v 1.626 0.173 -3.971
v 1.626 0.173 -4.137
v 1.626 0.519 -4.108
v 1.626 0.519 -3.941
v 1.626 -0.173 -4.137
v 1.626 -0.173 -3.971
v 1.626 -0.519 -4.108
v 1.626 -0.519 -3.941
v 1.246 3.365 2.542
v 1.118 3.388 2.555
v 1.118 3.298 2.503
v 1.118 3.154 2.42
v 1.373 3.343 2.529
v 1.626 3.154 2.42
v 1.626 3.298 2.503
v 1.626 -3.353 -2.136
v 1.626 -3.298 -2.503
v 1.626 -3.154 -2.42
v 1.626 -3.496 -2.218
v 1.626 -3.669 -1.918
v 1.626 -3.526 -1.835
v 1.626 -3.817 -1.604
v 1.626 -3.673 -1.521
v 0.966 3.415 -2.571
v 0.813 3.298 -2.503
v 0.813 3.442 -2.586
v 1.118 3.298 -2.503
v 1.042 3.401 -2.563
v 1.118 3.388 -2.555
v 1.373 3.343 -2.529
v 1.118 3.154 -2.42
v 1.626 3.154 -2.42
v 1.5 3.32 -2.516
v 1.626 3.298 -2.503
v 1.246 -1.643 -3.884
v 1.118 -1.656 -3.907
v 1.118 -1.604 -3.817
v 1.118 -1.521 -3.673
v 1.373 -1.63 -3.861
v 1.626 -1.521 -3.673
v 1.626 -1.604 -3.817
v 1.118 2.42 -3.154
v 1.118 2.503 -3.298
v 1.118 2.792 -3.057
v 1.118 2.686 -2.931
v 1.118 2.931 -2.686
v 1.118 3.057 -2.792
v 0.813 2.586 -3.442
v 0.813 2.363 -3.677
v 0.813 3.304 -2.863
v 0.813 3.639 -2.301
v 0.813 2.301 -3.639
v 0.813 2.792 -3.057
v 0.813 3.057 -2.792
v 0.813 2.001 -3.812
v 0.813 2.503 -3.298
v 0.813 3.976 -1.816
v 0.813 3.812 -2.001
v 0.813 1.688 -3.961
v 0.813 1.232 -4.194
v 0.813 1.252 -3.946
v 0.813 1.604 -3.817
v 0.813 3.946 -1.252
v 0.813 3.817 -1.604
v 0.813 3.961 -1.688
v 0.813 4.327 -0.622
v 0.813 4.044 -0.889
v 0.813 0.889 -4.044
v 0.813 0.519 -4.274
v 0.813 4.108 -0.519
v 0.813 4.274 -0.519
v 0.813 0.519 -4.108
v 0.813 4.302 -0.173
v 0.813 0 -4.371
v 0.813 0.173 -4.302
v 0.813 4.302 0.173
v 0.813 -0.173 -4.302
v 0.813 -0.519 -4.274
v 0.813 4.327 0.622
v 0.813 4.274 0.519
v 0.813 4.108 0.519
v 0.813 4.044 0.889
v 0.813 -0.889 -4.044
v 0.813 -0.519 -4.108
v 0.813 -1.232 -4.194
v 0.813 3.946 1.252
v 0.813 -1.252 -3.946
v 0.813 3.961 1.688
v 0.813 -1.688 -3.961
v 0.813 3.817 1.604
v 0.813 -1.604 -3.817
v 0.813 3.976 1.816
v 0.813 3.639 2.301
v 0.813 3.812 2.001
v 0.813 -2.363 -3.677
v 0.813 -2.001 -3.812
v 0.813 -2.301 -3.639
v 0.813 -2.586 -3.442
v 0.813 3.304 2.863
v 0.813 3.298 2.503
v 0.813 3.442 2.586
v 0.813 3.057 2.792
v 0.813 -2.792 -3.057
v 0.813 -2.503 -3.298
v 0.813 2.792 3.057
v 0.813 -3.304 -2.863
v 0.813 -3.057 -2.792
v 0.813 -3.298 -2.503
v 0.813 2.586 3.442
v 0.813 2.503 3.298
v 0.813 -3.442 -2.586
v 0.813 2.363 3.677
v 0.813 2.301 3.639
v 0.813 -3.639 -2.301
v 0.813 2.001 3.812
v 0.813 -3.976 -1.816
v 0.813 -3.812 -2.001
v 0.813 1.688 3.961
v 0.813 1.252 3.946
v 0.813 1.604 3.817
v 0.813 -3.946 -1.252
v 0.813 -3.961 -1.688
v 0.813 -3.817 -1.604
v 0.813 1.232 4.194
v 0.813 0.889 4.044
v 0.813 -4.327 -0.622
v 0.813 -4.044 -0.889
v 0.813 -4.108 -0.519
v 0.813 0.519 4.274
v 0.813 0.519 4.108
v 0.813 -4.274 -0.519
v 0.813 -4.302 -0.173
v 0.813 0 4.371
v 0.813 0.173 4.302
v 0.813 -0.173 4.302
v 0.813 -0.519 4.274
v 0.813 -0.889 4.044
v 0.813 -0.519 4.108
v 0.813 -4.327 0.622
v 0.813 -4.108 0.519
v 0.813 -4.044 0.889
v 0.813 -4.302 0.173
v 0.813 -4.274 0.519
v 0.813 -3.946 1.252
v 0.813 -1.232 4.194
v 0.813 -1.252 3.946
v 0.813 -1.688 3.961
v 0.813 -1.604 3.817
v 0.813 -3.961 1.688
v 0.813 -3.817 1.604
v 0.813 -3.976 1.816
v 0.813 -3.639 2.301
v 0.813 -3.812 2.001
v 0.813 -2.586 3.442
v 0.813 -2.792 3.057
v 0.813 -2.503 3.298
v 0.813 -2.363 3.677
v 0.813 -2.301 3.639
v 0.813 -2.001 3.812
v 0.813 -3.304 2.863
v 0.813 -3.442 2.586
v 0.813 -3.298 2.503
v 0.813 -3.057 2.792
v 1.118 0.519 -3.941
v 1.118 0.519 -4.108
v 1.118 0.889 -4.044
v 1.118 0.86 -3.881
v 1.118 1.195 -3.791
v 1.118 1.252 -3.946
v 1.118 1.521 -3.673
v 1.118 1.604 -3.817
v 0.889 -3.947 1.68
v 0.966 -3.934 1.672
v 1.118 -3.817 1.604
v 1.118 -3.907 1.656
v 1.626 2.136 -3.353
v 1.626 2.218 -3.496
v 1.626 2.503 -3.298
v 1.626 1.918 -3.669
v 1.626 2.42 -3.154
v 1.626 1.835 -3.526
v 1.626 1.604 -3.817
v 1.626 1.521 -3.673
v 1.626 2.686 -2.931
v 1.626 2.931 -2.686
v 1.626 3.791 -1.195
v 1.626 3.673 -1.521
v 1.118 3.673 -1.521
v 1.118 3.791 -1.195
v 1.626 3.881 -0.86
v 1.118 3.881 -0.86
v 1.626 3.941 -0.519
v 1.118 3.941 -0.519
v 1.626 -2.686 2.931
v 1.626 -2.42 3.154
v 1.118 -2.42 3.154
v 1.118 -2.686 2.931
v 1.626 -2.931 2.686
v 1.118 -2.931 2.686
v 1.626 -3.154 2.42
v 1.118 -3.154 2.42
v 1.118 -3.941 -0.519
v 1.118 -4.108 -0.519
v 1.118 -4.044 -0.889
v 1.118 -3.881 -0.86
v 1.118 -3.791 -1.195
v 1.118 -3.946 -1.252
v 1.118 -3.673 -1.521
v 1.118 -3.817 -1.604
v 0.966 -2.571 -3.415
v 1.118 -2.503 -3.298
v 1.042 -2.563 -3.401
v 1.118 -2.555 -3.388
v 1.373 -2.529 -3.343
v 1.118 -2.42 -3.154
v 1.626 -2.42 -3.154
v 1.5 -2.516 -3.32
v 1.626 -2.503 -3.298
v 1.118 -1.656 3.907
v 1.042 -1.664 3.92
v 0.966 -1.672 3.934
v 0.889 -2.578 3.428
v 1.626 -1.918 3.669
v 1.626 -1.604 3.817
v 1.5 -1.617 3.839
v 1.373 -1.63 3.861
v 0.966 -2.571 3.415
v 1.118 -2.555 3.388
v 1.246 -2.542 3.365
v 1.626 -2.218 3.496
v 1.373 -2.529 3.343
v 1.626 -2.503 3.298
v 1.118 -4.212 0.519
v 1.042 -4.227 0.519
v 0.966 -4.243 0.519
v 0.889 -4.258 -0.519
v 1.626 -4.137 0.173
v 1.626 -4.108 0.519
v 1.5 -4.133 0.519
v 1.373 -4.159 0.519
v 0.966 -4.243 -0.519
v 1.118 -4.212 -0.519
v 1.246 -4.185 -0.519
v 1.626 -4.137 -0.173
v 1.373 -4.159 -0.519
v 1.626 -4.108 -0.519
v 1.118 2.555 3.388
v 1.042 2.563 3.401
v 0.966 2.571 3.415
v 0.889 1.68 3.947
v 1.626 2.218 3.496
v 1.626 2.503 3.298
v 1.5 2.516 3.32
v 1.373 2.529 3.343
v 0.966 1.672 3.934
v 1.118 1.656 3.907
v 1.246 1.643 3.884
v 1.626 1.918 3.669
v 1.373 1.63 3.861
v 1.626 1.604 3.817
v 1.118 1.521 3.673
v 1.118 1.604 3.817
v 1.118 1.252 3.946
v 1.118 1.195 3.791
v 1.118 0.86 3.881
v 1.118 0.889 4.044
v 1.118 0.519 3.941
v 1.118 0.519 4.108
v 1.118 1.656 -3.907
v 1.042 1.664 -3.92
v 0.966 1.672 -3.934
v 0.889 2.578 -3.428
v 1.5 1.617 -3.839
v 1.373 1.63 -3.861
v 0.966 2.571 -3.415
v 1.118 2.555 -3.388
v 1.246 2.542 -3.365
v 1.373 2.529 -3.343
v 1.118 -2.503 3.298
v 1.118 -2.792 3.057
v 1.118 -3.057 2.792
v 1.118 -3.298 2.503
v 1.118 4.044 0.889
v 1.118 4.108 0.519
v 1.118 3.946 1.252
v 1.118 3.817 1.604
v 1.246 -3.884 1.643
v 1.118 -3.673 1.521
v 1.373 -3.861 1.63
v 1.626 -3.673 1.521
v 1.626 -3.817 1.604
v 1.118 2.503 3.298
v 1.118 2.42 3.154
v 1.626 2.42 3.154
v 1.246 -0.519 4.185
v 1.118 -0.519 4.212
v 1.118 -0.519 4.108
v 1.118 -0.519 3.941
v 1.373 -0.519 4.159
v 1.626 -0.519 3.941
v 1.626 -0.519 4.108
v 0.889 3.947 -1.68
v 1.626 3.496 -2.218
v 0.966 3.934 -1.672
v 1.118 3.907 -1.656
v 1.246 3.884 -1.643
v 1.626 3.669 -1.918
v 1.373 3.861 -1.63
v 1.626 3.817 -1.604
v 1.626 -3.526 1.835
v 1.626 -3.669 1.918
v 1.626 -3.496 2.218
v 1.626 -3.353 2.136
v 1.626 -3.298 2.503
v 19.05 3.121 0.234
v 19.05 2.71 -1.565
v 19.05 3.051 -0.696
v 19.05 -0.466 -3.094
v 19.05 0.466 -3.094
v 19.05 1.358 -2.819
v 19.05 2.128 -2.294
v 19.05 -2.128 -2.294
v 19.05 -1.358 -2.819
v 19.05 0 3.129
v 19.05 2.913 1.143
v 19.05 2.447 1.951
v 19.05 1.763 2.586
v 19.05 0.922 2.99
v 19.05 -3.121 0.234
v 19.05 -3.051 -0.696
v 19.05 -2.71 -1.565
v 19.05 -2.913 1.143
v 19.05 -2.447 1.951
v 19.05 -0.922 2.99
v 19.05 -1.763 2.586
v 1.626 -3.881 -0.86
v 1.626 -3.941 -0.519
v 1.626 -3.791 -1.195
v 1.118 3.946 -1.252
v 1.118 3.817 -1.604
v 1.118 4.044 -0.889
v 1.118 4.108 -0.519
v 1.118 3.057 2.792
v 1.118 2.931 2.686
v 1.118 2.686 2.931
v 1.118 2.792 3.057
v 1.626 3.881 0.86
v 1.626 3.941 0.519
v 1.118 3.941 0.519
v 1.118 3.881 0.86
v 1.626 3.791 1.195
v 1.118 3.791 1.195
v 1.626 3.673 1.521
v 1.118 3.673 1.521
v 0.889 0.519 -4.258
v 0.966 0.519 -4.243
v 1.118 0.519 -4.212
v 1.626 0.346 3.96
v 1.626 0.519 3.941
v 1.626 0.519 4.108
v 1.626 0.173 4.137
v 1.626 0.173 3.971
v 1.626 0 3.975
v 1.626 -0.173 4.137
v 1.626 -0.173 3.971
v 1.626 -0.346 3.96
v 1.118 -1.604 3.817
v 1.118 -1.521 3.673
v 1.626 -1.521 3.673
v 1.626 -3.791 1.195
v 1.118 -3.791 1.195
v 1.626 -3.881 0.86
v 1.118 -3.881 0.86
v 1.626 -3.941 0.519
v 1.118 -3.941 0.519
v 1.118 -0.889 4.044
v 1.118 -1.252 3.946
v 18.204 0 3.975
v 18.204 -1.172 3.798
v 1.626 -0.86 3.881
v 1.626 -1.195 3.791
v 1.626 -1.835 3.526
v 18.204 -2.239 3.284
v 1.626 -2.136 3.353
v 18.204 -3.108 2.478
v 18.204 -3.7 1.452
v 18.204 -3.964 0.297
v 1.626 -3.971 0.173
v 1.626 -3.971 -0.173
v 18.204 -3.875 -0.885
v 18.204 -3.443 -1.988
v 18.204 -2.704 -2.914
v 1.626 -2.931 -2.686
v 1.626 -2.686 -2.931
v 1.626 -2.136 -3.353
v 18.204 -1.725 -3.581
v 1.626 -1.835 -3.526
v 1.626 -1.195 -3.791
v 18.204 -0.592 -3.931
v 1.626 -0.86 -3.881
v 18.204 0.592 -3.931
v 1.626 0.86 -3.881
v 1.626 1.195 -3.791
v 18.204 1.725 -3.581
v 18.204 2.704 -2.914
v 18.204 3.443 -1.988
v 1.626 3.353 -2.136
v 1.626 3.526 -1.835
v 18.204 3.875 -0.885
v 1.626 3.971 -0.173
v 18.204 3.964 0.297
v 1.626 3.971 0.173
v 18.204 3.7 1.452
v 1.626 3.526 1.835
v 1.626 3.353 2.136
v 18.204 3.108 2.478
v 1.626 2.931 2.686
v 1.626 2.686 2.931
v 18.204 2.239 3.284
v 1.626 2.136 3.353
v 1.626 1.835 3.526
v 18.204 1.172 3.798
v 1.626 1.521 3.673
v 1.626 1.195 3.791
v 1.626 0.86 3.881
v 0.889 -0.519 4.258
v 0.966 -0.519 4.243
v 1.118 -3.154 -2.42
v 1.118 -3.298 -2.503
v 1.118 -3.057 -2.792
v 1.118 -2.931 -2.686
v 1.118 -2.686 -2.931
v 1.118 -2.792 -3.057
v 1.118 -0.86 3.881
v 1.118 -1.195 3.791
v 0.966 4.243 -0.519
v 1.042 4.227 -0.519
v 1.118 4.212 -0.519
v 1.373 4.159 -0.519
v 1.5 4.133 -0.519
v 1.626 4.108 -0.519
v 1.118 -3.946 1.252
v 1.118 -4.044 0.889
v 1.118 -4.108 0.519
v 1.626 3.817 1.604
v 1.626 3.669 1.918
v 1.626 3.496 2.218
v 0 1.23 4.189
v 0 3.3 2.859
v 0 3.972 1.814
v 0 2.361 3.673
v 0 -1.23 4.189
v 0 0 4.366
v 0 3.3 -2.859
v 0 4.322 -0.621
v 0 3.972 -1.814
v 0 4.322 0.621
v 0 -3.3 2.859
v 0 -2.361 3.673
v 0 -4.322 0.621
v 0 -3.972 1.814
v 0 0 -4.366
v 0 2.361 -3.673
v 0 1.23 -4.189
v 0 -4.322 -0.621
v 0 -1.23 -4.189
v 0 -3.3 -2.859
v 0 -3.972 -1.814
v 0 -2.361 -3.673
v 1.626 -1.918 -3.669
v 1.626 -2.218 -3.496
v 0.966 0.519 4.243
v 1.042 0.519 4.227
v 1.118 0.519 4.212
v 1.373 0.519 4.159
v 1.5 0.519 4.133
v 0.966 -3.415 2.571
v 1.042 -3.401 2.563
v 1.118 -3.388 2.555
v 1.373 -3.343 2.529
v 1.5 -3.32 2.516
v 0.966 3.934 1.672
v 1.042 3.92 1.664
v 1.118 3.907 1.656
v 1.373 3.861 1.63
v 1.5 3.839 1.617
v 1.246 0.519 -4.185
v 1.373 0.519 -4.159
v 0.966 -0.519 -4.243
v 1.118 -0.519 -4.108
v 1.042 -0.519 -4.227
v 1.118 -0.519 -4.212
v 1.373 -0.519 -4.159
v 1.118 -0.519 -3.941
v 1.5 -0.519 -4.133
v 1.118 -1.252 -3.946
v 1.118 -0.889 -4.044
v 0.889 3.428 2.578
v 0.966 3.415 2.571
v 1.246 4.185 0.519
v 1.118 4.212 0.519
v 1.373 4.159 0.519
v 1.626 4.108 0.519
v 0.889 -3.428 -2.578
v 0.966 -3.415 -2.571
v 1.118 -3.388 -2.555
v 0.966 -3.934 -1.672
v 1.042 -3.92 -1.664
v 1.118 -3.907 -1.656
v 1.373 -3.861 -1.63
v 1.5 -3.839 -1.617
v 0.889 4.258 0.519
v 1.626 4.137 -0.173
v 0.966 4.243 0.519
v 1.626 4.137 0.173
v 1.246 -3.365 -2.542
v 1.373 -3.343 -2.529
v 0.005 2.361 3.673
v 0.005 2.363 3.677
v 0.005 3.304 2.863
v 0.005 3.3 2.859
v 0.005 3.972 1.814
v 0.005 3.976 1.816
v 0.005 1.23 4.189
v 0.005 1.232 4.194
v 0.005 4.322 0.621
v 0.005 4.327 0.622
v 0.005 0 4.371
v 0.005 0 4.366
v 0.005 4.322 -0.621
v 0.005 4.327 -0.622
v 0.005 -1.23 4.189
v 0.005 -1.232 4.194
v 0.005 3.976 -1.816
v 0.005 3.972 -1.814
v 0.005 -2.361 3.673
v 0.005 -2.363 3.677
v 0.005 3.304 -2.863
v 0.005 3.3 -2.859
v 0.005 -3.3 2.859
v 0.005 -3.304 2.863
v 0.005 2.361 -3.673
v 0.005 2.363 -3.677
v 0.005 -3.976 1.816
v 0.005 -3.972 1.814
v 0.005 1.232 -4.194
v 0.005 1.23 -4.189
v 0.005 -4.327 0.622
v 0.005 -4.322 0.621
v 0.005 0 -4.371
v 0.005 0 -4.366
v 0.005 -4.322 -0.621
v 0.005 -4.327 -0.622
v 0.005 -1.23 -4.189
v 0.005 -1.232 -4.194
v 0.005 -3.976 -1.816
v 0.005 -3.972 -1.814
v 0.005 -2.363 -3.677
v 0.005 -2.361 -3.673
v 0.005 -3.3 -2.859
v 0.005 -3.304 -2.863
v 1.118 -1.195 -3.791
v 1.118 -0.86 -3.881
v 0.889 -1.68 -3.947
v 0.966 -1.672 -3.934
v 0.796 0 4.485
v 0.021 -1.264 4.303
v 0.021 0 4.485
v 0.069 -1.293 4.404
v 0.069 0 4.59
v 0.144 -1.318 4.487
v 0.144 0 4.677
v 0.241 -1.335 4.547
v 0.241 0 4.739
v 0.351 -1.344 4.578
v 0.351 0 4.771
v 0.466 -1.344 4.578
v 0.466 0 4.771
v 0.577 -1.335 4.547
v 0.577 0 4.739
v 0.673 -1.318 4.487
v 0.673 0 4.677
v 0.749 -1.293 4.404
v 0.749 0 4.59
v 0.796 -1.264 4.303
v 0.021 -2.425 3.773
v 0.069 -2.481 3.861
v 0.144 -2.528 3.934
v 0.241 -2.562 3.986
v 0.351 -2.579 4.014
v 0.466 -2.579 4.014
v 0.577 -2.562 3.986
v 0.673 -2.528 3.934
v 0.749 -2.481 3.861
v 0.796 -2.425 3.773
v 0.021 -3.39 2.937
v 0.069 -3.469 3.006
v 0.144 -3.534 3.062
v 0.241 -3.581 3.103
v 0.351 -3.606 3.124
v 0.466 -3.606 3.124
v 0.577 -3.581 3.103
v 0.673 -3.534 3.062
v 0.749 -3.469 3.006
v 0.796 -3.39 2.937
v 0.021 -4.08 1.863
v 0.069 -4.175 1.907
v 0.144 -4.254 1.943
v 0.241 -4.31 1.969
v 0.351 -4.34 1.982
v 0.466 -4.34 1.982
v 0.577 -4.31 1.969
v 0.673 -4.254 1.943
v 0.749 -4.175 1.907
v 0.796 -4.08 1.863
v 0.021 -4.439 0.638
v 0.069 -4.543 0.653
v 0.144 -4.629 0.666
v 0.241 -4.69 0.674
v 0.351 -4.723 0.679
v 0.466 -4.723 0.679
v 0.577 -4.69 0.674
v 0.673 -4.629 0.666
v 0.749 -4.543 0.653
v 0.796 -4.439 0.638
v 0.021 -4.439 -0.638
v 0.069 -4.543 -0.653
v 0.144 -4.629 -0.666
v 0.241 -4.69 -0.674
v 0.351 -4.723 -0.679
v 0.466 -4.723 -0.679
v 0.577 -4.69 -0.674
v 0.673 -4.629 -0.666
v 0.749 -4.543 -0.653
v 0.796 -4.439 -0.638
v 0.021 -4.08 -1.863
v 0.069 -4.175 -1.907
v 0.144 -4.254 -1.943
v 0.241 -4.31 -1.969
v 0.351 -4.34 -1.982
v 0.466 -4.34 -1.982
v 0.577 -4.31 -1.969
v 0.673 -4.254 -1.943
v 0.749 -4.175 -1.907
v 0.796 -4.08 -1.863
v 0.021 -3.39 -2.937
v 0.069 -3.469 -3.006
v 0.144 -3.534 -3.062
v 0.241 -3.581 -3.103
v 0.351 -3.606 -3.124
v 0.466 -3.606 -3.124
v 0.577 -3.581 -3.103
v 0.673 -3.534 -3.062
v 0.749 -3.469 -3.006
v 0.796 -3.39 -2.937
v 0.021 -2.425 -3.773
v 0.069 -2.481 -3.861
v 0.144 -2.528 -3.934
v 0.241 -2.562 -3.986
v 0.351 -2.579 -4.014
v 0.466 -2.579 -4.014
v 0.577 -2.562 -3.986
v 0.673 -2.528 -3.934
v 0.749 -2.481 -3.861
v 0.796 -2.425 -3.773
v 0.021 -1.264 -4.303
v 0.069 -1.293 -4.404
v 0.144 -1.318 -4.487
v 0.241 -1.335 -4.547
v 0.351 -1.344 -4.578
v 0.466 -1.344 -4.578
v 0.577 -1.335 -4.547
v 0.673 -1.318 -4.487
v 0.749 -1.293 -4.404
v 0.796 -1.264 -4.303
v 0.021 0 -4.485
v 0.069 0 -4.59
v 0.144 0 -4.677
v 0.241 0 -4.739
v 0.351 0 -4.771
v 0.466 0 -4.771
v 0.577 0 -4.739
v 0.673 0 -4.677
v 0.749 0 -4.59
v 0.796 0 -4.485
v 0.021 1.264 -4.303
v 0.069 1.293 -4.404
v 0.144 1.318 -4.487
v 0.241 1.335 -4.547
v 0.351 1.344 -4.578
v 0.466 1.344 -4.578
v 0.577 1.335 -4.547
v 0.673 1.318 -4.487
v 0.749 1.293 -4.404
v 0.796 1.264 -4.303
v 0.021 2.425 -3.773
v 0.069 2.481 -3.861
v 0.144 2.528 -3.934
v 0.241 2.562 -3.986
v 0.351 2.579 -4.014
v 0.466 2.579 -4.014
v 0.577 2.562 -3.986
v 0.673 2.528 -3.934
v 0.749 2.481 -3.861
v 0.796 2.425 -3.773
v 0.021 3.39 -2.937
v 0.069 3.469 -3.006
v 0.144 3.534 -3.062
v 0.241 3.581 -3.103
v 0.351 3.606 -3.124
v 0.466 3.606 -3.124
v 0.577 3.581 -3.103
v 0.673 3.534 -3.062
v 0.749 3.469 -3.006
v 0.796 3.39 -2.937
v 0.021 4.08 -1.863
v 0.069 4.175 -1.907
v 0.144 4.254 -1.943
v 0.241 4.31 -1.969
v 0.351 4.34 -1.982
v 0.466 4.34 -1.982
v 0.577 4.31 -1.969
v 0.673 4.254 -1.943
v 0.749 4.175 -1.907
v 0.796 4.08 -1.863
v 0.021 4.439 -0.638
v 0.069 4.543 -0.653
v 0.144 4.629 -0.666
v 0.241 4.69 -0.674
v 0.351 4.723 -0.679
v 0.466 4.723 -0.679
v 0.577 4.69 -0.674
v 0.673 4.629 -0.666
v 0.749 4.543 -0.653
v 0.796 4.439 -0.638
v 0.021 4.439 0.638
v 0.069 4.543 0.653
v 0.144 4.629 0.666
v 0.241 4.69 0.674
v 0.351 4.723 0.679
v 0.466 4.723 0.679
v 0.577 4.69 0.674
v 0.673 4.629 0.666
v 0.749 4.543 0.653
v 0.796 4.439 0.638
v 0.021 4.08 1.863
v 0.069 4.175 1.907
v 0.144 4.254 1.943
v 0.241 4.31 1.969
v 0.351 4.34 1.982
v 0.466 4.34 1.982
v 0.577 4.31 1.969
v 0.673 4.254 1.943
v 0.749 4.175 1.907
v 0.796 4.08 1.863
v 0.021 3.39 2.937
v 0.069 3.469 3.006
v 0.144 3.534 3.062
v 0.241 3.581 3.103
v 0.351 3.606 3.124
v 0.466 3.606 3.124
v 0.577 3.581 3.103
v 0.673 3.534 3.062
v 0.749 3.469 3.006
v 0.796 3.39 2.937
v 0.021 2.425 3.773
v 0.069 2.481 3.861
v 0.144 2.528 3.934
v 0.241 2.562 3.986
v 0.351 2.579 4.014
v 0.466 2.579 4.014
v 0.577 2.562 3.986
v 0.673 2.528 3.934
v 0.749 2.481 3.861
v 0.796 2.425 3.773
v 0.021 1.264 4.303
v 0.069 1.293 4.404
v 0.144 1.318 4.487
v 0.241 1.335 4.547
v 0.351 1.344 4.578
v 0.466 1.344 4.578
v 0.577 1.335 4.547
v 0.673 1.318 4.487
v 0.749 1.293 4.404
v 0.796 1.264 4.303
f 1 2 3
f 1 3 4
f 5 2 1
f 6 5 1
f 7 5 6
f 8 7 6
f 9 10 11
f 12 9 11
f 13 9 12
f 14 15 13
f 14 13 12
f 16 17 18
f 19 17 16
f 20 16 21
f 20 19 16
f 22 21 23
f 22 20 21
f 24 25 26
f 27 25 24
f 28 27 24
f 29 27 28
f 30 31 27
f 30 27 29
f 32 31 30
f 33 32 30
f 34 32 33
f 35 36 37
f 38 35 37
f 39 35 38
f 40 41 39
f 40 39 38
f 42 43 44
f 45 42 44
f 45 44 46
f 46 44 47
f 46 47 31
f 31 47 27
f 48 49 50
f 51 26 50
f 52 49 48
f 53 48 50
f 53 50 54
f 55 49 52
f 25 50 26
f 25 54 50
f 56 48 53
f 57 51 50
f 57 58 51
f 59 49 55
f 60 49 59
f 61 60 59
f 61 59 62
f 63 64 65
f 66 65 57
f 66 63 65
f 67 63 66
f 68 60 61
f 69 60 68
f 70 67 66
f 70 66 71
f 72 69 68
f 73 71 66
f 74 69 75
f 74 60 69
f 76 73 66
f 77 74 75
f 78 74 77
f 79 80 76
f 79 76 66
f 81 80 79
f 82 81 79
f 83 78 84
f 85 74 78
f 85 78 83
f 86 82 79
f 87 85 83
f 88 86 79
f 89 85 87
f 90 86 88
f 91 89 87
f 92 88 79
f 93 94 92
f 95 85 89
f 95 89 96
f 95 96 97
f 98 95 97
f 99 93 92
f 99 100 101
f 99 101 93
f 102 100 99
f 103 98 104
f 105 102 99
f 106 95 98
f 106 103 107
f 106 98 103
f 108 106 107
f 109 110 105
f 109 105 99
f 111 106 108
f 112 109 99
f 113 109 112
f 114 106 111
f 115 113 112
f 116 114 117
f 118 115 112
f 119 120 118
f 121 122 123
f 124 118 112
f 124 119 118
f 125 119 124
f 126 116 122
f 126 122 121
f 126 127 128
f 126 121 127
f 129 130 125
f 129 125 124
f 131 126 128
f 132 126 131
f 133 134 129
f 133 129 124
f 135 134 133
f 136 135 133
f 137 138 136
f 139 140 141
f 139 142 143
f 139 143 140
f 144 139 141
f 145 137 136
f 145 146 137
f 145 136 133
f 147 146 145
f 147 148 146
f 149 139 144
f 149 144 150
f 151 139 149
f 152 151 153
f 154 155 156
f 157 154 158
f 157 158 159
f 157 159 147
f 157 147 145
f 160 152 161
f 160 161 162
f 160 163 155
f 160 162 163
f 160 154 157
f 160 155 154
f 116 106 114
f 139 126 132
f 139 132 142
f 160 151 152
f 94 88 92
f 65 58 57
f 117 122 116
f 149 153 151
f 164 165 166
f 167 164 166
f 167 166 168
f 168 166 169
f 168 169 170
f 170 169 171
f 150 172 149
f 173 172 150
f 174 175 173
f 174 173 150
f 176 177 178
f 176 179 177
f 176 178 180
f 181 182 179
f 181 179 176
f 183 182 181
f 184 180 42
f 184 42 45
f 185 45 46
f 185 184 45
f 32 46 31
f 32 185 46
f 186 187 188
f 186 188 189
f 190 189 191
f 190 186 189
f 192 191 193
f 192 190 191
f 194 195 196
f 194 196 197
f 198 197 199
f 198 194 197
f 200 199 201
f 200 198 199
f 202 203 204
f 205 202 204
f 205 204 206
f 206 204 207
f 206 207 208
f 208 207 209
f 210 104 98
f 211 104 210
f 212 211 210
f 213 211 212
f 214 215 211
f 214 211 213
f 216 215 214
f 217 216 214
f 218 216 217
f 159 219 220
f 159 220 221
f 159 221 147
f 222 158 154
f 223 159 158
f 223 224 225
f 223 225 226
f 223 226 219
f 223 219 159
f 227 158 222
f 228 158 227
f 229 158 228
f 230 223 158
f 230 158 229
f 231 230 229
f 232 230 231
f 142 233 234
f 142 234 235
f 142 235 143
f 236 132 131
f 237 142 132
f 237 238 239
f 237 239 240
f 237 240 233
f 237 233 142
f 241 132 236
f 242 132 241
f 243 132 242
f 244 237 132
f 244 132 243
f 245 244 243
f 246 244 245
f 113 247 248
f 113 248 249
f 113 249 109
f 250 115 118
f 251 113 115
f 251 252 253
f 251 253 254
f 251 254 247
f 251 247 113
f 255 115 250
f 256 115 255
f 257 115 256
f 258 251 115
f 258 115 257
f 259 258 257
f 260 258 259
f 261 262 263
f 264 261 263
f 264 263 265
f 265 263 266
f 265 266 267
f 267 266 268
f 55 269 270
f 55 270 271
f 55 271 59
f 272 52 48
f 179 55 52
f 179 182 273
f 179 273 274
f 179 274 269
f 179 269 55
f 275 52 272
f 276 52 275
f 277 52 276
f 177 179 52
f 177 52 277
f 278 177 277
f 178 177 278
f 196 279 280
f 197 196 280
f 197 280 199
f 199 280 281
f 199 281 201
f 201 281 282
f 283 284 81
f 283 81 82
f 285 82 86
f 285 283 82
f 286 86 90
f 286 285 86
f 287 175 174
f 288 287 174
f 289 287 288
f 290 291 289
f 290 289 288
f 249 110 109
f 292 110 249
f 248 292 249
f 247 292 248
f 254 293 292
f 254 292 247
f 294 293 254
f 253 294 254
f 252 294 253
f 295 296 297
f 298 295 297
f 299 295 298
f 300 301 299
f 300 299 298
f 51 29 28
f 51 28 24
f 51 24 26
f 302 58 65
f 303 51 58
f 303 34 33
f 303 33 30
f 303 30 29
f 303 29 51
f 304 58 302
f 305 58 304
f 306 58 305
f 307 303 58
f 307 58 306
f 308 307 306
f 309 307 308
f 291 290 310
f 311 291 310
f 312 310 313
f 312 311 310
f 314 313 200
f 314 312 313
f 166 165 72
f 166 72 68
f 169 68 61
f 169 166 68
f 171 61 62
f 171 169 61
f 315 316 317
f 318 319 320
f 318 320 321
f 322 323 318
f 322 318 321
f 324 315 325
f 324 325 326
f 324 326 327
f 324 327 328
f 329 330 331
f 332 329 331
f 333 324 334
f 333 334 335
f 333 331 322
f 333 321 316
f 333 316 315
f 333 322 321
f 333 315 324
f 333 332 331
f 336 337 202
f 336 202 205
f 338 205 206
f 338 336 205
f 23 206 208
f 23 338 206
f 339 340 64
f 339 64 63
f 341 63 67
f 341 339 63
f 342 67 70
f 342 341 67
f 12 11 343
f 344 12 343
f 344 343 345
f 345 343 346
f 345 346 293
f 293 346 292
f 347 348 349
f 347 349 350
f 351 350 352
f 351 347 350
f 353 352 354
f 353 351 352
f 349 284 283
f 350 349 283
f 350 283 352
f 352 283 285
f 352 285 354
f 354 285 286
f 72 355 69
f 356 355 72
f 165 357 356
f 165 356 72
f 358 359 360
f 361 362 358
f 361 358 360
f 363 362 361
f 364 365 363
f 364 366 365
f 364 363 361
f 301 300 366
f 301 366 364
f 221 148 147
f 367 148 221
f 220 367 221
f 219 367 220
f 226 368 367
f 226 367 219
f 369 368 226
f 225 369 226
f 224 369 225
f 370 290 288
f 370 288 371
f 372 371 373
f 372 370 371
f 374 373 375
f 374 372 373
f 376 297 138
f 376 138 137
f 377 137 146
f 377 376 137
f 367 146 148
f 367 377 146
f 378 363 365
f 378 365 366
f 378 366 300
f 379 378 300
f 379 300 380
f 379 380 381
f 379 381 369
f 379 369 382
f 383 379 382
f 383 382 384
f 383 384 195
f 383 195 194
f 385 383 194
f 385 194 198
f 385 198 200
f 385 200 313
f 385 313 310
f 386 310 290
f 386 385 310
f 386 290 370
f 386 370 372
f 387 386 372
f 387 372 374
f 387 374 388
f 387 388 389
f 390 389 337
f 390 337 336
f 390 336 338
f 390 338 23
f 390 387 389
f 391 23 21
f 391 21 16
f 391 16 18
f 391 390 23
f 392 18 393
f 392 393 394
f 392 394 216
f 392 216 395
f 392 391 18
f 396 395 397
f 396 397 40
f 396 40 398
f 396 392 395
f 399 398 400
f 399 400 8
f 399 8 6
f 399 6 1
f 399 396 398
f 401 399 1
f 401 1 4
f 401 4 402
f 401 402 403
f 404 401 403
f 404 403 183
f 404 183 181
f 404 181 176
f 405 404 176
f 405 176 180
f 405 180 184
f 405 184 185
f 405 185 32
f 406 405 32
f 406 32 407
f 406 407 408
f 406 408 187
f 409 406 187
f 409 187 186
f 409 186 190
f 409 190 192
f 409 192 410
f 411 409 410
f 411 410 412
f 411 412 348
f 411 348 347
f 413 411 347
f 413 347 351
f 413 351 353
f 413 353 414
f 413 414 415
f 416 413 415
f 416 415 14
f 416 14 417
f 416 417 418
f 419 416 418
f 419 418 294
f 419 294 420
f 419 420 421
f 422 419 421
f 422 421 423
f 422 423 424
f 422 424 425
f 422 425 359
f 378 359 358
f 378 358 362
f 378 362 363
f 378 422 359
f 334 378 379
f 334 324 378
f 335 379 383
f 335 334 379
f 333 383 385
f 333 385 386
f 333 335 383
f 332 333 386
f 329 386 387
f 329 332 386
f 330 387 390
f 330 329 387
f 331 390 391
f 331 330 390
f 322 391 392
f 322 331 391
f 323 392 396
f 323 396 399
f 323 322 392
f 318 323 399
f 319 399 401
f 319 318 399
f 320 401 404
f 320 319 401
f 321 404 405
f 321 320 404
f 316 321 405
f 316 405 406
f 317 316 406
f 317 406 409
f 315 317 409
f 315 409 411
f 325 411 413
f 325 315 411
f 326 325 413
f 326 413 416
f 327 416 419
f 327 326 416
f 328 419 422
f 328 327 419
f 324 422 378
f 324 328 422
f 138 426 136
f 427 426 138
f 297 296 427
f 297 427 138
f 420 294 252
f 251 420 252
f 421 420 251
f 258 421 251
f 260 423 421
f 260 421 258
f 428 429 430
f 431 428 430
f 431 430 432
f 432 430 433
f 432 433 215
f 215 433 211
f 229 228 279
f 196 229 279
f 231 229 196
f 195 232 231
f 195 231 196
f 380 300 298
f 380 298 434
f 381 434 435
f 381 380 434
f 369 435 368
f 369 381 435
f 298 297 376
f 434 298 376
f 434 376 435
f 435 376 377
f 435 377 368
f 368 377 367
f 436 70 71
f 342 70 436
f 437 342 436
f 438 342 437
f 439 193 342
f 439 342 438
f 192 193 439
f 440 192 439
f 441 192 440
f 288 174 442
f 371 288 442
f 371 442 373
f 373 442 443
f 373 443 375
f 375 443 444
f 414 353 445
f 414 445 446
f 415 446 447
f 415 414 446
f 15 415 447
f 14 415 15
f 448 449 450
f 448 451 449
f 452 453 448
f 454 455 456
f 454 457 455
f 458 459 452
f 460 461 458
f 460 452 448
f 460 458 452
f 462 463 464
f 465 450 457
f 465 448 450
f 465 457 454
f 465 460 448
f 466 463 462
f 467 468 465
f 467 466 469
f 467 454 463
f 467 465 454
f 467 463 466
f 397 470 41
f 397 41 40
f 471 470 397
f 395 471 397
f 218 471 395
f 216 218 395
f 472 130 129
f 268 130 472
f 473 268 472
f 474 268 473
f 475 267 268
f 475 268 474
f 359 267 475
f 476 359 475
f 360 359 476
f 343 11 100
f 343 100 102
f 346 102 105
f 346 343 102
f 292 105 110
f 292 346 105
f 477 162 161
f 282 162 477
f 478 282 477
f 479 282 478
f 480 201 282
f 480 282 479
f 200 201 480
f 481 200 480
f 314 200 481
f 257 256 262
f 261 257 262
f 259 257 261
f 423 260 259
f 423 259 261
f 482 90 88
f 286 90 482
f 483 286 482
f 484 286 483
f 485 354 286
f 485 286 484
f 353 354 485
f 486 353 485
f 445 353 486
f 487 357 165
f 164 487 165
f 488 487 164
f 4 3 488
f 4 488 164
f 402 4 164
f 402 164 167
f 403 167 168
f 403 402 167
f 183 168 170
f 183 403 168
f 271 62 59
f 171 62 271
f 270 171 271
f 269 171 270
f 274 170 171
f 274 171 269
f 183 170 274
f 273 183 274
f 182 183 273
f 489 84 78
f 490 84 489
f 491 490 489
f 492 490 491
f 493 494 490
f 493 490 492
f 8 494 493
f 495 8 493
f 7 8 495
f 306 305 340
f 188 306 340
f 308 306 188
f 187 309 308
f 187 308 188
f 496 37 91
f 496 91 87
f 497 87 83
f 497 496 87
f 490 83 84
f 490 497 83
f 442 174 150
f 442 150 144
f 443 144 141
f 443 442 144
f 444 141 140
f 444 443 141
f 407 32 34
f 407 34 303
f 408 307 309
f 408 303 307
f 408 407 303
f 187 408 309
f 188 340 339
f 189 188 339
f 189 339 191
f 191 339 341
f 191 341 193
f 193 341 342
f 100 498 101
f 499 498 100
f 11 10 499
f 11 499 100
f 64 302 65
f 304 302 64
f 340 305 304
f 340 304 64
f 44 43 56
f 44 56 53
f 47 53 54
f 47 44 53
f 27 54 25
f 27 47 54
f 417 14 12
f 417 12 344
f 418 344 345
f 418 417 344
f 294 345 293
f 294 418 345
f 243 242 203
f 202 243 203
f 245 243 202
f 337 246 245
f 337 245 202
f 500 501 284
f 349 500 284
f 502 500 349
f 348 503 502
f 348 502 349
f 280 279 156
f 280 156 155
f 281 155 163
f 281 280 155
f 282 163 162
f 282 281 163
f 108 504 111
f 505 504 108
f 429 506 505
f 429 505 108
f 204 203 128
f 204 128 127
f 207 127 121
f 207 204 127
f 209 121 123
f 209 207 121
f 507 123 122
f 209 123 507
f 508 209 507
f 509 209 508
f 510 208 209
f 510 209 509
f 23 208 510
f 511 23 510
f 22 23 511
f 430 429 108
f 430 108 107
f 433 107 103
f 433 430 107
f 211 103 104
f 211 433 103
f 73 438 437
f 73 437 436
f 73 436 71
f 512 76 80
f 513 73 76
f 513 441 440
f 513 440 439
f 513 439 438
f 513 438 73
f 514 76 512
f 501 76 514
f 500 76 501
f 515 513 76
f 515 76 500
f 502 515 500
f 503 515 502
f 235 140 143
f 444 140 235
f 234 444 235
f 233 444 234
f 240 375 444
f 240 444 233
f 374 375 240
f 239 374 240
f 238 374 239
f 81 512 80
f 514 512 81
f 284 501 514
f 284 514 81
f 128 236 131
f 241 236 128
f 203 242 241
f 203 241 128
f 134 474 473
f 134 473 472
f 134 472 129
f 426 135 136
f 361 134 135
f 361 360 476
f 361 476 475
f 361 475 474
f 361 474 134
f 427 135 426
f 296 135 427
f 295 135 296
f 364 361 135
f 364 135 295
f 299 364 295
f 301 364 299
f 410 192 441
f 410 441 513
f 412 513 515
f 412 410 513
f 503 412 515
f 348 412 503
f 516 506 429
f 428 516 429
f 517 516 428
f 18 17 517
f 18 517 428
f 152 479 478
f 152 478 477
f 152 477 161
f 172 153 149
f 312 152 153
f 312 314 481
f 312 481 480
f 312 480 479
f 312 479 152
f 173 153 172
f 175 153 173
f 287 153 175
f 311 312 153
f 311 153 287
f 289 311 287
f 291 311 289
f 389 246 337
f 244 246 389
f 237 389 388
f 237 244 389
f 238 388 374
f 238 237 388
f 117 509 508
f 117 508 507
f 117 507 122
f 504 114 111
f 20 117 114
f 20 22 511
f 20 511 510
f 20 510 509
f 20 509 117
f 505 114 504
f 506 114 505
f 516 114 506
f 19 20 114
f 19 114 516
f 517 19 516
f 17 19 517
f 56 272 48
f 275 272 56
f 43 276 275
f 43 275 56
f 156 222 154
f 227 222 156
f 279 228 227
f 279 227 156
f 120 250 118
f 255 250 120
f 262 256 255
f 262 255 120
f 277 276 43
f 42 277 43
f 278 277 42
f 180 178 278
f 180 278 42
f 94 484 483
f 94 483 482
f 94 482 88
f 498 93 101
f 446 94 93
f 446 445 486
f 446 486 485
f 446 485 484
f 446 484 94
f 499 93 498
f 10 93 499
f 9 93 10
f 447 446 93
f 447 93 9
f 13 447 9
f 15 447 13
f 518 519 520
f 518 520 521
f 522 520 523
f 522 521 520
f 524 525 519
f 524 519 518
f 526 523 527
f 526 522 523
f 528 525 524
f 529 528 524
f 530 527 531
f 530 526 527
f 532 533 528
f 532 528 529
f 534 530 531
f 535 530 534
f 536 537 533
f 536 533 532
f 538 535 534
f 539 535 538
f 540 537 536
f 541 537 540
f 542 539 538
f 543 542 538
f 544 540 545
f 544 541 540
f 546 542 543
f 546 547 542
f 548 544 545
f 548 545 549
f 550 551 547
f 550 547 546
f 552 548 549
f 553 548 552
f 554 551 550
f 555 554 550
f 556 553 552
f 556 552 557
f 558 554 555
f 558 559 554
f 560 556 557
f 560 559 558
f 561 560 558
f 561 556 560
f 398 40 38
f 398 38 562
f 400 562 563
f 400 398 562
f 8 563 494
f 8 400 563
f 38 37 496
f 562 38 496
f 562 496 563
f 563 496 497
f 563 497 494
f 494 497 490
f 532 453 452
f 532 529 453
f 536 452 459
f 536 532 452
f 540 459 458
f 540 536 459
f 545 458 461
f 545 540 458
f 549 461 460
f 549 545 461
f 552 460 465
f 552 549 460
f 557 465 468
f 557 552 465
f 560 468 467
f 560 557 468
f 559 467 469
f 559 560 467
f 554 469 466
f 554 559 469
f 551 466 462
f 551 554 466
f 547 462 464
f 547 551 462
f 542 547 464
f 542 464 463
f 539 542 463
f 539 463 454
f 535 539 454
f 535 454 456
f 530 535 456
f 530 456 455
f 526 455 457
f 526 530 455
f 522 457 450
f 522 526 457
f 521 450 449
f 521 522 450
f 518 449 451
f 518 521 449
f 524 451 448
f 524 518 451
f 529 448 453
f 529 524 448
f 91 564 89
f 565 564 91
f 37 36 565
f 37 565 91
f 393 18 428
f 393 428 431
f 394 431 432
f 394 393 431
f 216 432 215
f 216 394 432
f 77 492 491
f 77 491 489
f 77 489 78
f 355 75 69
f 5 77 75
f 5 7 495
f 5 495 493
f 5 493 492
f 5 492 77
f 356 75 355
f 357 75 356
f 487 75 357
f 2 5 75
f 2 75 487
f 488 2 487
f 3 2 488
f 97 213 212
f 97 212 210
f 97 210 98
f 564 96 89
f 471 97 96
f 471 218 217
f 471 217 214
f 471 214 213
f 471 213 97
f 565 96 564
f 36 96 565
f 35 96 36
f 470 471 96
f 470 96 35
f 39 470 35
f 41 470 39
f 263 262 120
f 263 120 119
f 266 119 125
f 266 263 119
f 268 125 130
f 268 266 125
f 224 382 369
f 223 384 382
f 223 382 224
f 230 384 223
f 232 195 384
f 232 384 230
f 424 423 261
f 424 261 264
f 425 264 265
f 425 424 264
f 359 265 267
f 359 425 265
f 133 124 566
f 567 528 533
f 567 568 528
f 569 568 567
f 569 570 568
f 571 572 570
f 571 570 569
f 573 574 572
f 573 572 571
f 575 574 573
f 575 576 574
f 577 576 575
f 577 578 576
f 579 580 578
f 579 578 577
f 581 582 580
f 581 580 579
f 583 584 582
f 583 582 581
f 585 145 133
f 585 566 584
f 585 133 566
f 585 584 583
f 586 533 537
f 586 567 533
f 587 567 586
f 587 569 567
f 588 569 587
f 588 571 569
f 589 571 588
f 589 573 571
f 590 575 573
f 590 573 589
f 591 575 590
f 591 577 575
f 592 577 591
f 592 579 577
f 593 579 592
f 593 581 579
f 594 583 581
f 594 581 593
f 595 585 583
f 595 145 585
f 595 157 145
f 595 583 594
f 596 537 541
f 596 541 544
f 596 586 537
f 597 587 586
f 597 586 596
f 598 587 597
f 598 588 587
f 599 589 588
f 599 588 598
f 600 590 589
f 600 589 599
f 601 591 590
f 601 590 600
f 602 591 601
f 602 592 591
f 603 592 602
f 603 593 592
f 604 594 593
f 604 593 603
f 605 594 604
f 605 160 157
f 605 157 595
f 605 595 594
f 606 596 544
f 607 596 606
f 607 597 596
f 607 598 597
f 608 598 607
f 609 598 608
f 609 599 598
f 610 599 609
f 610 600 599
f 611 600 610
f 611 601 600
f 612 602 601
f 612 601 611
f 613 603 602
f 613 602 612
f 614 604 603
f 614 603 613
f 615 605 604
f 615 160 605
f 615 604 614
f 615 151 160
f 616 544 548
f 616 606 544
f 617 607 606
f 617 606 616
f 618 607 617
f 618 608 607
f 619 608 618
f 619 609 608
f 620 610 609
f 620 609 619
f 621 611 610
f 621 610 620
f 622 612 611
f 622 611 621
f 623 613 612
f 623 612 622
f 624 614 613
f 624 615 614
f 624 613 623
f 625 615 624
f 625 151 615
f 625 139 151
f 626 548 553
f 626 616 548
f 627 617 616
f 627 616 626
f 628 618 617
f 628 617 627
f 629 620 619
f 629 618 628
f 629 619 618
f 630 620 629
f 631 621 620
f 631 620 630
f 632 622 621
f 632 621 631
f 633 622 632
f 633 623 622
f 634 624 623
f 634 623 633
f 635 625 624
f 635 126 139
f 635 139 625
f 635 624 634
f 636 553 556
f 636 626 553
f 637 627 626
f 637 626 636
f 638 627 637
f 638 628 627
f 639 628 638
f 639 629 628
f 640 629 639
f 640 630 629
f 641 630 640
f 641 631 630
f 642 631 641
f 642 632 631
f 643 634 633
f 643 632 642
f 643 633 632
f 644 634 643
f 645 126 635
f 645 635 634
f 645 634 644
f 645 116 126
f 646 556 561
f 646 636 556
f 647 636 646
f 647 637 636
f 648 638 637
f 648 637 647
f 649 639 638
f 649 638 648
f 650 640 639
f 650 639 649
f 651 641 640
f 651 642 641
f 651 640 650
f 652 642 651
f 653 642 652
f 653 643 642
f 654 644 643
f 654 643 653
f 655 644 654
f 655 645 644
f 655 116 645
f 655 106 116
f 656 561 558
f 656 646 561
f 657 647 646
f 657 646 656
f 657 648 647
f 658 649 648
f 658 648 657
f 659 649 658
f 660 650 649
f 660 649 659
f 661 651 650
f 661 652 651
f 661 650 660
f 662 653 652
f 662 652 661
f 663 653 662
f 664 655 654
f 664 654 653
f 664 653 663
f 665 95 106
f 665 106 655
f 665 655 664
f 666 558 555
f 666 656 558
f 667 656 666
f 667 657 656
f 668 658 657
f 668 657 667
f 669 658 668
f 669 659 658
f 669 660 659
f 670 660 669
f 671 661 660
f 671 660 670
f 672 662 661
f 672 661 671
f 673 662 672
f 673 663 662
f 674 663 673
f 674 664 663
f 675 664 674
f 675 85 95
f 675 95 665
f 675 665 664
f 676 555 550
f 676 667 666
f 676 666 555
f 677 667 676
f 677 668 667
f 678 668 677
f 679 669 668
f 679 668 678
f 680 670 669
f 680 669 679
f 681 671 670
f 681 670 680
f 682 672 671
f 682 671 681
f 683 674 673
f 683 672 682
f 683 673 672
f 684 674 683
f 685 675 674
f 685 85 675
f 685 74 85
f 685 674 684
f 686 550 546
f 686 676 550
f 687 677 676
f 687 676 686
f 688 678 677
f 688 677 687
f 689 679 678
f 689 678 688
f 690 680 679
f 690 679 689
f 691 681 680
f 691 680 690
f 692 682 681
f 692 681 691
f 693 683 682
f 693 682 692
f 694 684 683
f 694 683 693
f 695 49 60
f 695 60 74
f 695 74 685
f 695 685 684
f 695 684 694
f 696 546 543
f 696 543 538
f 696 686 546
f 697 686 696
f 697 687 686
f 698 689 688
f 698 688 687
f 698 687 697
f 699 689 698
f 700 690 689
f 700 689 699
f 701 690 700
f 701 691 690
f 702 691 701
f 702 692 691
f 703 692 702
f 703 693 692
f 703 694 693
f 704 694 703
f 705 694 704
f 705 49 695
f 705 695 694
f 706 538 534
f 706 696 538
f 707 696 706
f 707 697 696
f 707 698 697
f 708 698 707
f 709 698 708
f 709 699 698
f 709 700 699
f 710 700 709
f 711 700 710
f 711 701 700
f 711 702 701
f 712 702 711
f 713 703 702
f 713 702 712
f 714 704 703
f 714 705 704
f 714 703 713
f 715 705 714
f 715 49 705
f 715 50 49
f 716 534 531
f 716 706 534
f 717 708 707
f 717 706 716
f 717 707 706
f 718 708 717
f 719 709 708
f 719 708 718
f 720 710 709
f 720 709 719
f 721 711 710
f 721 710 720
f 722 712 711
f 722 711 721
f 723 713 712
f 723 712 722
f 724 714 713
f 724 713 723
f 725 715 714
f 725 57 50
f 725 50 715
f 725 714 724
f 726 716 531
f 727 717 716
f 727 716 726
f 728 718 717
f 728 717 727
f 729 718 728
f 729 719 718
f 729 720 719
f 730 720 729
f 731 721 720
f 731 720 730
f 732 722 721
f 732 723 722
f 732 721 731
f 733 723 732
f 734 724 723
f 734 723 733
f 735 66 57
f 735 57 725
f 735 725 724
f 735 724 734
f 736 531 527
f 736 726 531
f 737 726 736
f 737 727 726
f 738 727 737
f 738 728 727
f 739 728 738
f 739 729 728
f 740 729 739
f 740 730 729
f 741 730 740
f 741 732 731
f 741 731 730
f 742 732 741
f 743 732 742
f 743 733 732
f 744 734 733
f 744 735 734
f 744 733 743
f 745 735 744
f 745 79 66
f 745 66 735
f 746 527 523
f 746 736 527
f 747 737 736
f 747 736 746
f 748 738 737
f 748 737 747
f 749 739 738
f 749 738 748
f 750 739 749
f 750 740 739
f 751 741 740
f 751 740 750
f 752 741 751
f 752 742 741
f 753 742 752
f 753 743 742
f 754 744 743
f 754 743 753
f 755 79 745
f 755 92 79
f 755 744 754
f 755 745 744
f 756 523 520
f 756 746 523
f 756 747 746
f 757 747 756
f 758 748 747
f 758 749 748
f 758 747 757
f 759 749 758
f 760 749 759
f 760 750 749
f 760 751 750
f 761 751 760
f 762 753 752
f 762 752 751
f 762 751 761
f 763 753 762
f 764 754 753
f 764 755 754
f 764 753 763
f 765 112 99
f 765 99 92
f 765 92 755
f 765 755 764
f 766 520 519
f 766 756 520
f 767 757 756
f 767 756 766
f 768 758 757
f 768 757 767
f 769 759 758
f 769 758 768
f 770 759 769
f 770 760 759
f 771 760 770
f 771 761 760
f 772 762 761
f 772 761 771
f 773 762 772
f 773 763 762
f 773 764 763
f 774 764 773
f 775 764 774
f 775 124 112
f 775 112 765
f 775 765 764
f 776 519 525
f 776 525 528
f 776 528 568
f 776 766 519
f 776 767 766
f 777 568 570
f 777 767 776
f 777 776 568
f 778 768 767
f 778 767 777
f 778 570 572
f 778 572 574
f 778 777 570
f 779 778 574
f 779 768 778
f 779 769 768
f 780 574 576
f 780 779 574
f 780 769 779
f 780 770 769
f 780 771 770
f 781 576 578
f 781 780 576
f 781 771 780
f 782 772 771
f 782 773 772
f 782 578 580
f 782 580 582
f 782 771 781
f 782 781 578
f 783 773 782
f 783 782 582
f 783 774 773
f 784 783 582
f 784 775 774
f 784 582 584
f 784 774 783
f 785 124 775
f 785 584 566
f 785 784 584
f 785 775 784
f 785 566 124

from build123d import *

# Parameters (mm, degrees)
RIBCUT1_DEPTH    = 0.508
RIBCUT2_DEPTH    = 0.8128
RIBCUTSPAT_COUNT = 12
RIBCUTSPAT_ANGLE = 330


with BuildPart() as part:
    # BodySke → BaseBody (revolve)
    with BuildSketch(Plane.XY, mode=Mode.PRIVATE) as basebody_sk:
        with BuildLine():
            Line((0, 0), (0, 4.36626))
            Line((0, 4.36626), (0.00508, 4.36626))
            Line((0.00508, 4.36626), (0.00508, 4.37134))
            ThreePointArc((0.00508, 4.37134), (0.40894, 4.7752), (0.8128, 4.37134))
            Line((0.8128, 4.37134), (0.8128, 4.3053))
            Line((0.8128, 4.3053), (1.6256, 4.1402))
            Line((1.6256, 4.1402), (1.6256, 3.9751))
            Line((1.6256, 3.9751), (18.20418, 3.9751))
            Line((18.20418, 3.9751), (19.05, 3.12928))
            Line((19.05, 3.12928), (19.05, 0))
            Line((19.05, 0), (0, 0))
        make_face()
    revolve(basebody_sk.sketch.rotate(Axis((0, 0, 0), (1, 0, 0)), 90), axis=Axis((0, 0, 0), (1, 0, 0)))

    # RibCut1Ske → RibCut1 (cut)
    with BuildSketch(Plane(origin=(1.6256, 0, 0), x_dir=(0, 0, -1), z_dir=(1, 0, 0))):
        with BuildLine():
            Line((0.518854667, 3.941092468), (0.518854667, 4.746927941))
            ThreePointArc((0.518854667, 4.746927941), (1.235912704, 4.612489006), (1.924122648, 4.37038752))
            Line((1.924122648, 4.37038752), (1.521204912, 3.67251353))
            ThreePointArc((1.521204912, 3.67251353), (1.028831586, 3.839651752), (0.518854667, 3.941092468))
        make_face()
    ribcut1 = extrude(amount=-RIBCUT1_DEPTH, mode=Mode.SUBTRACT)

    # RibCut2Ske → RibCut2 (cut)
    with BuildSketch(Plane(origin=(1.6256, 0, 0), x_dir=(0, 0, -1), z_dir=(1, 0, 0))):
        with BuildLine():
            Line((0.518854667, 4.107559601), (0.518854667, 4.746927941))
            ThreePointArc((0.518854667, 4.746927941), (1.235912704, 4.612489006), (1.924122648, 4.37038752))
            Line((1.924122648, 4.37038752), (1.604438478, 3.816678295))
            ThreePointArc((1.604438478, 3.816678295), (1.071562611, 3.999126106), (0.518854667, 4.107559601))
        make_face()
    ribcut2 = extrude(amount=-RIBCUT2_DEPTH, mode=Mode.SUBTRACT)

    # RibCutsPat: RibCut1, RibCut2 ×12 about axis
    ribcutspat_axis = Axis((0, 0, 0), (1, 0, 0))
    add([ribcut1.rotate(ribcutspat_axis, i * RIBCUTSPAT_ANGLE / (RIBCUTSPAT_COUNT - 1)) for i in range(1, RIBCUTSPAT_COUNT)], mode=Mode.SUBTRACT)
    add([ribcut2.rotate(ribcutspat_axis, i * RIBCUTSPAT_ANGLE / (RIBCUTSPAT_COUNT - 1)) for i in range(1, RIBCUTSPAT_COUNT)], mode=Mode.SUBTRACT)


solid = part.part
